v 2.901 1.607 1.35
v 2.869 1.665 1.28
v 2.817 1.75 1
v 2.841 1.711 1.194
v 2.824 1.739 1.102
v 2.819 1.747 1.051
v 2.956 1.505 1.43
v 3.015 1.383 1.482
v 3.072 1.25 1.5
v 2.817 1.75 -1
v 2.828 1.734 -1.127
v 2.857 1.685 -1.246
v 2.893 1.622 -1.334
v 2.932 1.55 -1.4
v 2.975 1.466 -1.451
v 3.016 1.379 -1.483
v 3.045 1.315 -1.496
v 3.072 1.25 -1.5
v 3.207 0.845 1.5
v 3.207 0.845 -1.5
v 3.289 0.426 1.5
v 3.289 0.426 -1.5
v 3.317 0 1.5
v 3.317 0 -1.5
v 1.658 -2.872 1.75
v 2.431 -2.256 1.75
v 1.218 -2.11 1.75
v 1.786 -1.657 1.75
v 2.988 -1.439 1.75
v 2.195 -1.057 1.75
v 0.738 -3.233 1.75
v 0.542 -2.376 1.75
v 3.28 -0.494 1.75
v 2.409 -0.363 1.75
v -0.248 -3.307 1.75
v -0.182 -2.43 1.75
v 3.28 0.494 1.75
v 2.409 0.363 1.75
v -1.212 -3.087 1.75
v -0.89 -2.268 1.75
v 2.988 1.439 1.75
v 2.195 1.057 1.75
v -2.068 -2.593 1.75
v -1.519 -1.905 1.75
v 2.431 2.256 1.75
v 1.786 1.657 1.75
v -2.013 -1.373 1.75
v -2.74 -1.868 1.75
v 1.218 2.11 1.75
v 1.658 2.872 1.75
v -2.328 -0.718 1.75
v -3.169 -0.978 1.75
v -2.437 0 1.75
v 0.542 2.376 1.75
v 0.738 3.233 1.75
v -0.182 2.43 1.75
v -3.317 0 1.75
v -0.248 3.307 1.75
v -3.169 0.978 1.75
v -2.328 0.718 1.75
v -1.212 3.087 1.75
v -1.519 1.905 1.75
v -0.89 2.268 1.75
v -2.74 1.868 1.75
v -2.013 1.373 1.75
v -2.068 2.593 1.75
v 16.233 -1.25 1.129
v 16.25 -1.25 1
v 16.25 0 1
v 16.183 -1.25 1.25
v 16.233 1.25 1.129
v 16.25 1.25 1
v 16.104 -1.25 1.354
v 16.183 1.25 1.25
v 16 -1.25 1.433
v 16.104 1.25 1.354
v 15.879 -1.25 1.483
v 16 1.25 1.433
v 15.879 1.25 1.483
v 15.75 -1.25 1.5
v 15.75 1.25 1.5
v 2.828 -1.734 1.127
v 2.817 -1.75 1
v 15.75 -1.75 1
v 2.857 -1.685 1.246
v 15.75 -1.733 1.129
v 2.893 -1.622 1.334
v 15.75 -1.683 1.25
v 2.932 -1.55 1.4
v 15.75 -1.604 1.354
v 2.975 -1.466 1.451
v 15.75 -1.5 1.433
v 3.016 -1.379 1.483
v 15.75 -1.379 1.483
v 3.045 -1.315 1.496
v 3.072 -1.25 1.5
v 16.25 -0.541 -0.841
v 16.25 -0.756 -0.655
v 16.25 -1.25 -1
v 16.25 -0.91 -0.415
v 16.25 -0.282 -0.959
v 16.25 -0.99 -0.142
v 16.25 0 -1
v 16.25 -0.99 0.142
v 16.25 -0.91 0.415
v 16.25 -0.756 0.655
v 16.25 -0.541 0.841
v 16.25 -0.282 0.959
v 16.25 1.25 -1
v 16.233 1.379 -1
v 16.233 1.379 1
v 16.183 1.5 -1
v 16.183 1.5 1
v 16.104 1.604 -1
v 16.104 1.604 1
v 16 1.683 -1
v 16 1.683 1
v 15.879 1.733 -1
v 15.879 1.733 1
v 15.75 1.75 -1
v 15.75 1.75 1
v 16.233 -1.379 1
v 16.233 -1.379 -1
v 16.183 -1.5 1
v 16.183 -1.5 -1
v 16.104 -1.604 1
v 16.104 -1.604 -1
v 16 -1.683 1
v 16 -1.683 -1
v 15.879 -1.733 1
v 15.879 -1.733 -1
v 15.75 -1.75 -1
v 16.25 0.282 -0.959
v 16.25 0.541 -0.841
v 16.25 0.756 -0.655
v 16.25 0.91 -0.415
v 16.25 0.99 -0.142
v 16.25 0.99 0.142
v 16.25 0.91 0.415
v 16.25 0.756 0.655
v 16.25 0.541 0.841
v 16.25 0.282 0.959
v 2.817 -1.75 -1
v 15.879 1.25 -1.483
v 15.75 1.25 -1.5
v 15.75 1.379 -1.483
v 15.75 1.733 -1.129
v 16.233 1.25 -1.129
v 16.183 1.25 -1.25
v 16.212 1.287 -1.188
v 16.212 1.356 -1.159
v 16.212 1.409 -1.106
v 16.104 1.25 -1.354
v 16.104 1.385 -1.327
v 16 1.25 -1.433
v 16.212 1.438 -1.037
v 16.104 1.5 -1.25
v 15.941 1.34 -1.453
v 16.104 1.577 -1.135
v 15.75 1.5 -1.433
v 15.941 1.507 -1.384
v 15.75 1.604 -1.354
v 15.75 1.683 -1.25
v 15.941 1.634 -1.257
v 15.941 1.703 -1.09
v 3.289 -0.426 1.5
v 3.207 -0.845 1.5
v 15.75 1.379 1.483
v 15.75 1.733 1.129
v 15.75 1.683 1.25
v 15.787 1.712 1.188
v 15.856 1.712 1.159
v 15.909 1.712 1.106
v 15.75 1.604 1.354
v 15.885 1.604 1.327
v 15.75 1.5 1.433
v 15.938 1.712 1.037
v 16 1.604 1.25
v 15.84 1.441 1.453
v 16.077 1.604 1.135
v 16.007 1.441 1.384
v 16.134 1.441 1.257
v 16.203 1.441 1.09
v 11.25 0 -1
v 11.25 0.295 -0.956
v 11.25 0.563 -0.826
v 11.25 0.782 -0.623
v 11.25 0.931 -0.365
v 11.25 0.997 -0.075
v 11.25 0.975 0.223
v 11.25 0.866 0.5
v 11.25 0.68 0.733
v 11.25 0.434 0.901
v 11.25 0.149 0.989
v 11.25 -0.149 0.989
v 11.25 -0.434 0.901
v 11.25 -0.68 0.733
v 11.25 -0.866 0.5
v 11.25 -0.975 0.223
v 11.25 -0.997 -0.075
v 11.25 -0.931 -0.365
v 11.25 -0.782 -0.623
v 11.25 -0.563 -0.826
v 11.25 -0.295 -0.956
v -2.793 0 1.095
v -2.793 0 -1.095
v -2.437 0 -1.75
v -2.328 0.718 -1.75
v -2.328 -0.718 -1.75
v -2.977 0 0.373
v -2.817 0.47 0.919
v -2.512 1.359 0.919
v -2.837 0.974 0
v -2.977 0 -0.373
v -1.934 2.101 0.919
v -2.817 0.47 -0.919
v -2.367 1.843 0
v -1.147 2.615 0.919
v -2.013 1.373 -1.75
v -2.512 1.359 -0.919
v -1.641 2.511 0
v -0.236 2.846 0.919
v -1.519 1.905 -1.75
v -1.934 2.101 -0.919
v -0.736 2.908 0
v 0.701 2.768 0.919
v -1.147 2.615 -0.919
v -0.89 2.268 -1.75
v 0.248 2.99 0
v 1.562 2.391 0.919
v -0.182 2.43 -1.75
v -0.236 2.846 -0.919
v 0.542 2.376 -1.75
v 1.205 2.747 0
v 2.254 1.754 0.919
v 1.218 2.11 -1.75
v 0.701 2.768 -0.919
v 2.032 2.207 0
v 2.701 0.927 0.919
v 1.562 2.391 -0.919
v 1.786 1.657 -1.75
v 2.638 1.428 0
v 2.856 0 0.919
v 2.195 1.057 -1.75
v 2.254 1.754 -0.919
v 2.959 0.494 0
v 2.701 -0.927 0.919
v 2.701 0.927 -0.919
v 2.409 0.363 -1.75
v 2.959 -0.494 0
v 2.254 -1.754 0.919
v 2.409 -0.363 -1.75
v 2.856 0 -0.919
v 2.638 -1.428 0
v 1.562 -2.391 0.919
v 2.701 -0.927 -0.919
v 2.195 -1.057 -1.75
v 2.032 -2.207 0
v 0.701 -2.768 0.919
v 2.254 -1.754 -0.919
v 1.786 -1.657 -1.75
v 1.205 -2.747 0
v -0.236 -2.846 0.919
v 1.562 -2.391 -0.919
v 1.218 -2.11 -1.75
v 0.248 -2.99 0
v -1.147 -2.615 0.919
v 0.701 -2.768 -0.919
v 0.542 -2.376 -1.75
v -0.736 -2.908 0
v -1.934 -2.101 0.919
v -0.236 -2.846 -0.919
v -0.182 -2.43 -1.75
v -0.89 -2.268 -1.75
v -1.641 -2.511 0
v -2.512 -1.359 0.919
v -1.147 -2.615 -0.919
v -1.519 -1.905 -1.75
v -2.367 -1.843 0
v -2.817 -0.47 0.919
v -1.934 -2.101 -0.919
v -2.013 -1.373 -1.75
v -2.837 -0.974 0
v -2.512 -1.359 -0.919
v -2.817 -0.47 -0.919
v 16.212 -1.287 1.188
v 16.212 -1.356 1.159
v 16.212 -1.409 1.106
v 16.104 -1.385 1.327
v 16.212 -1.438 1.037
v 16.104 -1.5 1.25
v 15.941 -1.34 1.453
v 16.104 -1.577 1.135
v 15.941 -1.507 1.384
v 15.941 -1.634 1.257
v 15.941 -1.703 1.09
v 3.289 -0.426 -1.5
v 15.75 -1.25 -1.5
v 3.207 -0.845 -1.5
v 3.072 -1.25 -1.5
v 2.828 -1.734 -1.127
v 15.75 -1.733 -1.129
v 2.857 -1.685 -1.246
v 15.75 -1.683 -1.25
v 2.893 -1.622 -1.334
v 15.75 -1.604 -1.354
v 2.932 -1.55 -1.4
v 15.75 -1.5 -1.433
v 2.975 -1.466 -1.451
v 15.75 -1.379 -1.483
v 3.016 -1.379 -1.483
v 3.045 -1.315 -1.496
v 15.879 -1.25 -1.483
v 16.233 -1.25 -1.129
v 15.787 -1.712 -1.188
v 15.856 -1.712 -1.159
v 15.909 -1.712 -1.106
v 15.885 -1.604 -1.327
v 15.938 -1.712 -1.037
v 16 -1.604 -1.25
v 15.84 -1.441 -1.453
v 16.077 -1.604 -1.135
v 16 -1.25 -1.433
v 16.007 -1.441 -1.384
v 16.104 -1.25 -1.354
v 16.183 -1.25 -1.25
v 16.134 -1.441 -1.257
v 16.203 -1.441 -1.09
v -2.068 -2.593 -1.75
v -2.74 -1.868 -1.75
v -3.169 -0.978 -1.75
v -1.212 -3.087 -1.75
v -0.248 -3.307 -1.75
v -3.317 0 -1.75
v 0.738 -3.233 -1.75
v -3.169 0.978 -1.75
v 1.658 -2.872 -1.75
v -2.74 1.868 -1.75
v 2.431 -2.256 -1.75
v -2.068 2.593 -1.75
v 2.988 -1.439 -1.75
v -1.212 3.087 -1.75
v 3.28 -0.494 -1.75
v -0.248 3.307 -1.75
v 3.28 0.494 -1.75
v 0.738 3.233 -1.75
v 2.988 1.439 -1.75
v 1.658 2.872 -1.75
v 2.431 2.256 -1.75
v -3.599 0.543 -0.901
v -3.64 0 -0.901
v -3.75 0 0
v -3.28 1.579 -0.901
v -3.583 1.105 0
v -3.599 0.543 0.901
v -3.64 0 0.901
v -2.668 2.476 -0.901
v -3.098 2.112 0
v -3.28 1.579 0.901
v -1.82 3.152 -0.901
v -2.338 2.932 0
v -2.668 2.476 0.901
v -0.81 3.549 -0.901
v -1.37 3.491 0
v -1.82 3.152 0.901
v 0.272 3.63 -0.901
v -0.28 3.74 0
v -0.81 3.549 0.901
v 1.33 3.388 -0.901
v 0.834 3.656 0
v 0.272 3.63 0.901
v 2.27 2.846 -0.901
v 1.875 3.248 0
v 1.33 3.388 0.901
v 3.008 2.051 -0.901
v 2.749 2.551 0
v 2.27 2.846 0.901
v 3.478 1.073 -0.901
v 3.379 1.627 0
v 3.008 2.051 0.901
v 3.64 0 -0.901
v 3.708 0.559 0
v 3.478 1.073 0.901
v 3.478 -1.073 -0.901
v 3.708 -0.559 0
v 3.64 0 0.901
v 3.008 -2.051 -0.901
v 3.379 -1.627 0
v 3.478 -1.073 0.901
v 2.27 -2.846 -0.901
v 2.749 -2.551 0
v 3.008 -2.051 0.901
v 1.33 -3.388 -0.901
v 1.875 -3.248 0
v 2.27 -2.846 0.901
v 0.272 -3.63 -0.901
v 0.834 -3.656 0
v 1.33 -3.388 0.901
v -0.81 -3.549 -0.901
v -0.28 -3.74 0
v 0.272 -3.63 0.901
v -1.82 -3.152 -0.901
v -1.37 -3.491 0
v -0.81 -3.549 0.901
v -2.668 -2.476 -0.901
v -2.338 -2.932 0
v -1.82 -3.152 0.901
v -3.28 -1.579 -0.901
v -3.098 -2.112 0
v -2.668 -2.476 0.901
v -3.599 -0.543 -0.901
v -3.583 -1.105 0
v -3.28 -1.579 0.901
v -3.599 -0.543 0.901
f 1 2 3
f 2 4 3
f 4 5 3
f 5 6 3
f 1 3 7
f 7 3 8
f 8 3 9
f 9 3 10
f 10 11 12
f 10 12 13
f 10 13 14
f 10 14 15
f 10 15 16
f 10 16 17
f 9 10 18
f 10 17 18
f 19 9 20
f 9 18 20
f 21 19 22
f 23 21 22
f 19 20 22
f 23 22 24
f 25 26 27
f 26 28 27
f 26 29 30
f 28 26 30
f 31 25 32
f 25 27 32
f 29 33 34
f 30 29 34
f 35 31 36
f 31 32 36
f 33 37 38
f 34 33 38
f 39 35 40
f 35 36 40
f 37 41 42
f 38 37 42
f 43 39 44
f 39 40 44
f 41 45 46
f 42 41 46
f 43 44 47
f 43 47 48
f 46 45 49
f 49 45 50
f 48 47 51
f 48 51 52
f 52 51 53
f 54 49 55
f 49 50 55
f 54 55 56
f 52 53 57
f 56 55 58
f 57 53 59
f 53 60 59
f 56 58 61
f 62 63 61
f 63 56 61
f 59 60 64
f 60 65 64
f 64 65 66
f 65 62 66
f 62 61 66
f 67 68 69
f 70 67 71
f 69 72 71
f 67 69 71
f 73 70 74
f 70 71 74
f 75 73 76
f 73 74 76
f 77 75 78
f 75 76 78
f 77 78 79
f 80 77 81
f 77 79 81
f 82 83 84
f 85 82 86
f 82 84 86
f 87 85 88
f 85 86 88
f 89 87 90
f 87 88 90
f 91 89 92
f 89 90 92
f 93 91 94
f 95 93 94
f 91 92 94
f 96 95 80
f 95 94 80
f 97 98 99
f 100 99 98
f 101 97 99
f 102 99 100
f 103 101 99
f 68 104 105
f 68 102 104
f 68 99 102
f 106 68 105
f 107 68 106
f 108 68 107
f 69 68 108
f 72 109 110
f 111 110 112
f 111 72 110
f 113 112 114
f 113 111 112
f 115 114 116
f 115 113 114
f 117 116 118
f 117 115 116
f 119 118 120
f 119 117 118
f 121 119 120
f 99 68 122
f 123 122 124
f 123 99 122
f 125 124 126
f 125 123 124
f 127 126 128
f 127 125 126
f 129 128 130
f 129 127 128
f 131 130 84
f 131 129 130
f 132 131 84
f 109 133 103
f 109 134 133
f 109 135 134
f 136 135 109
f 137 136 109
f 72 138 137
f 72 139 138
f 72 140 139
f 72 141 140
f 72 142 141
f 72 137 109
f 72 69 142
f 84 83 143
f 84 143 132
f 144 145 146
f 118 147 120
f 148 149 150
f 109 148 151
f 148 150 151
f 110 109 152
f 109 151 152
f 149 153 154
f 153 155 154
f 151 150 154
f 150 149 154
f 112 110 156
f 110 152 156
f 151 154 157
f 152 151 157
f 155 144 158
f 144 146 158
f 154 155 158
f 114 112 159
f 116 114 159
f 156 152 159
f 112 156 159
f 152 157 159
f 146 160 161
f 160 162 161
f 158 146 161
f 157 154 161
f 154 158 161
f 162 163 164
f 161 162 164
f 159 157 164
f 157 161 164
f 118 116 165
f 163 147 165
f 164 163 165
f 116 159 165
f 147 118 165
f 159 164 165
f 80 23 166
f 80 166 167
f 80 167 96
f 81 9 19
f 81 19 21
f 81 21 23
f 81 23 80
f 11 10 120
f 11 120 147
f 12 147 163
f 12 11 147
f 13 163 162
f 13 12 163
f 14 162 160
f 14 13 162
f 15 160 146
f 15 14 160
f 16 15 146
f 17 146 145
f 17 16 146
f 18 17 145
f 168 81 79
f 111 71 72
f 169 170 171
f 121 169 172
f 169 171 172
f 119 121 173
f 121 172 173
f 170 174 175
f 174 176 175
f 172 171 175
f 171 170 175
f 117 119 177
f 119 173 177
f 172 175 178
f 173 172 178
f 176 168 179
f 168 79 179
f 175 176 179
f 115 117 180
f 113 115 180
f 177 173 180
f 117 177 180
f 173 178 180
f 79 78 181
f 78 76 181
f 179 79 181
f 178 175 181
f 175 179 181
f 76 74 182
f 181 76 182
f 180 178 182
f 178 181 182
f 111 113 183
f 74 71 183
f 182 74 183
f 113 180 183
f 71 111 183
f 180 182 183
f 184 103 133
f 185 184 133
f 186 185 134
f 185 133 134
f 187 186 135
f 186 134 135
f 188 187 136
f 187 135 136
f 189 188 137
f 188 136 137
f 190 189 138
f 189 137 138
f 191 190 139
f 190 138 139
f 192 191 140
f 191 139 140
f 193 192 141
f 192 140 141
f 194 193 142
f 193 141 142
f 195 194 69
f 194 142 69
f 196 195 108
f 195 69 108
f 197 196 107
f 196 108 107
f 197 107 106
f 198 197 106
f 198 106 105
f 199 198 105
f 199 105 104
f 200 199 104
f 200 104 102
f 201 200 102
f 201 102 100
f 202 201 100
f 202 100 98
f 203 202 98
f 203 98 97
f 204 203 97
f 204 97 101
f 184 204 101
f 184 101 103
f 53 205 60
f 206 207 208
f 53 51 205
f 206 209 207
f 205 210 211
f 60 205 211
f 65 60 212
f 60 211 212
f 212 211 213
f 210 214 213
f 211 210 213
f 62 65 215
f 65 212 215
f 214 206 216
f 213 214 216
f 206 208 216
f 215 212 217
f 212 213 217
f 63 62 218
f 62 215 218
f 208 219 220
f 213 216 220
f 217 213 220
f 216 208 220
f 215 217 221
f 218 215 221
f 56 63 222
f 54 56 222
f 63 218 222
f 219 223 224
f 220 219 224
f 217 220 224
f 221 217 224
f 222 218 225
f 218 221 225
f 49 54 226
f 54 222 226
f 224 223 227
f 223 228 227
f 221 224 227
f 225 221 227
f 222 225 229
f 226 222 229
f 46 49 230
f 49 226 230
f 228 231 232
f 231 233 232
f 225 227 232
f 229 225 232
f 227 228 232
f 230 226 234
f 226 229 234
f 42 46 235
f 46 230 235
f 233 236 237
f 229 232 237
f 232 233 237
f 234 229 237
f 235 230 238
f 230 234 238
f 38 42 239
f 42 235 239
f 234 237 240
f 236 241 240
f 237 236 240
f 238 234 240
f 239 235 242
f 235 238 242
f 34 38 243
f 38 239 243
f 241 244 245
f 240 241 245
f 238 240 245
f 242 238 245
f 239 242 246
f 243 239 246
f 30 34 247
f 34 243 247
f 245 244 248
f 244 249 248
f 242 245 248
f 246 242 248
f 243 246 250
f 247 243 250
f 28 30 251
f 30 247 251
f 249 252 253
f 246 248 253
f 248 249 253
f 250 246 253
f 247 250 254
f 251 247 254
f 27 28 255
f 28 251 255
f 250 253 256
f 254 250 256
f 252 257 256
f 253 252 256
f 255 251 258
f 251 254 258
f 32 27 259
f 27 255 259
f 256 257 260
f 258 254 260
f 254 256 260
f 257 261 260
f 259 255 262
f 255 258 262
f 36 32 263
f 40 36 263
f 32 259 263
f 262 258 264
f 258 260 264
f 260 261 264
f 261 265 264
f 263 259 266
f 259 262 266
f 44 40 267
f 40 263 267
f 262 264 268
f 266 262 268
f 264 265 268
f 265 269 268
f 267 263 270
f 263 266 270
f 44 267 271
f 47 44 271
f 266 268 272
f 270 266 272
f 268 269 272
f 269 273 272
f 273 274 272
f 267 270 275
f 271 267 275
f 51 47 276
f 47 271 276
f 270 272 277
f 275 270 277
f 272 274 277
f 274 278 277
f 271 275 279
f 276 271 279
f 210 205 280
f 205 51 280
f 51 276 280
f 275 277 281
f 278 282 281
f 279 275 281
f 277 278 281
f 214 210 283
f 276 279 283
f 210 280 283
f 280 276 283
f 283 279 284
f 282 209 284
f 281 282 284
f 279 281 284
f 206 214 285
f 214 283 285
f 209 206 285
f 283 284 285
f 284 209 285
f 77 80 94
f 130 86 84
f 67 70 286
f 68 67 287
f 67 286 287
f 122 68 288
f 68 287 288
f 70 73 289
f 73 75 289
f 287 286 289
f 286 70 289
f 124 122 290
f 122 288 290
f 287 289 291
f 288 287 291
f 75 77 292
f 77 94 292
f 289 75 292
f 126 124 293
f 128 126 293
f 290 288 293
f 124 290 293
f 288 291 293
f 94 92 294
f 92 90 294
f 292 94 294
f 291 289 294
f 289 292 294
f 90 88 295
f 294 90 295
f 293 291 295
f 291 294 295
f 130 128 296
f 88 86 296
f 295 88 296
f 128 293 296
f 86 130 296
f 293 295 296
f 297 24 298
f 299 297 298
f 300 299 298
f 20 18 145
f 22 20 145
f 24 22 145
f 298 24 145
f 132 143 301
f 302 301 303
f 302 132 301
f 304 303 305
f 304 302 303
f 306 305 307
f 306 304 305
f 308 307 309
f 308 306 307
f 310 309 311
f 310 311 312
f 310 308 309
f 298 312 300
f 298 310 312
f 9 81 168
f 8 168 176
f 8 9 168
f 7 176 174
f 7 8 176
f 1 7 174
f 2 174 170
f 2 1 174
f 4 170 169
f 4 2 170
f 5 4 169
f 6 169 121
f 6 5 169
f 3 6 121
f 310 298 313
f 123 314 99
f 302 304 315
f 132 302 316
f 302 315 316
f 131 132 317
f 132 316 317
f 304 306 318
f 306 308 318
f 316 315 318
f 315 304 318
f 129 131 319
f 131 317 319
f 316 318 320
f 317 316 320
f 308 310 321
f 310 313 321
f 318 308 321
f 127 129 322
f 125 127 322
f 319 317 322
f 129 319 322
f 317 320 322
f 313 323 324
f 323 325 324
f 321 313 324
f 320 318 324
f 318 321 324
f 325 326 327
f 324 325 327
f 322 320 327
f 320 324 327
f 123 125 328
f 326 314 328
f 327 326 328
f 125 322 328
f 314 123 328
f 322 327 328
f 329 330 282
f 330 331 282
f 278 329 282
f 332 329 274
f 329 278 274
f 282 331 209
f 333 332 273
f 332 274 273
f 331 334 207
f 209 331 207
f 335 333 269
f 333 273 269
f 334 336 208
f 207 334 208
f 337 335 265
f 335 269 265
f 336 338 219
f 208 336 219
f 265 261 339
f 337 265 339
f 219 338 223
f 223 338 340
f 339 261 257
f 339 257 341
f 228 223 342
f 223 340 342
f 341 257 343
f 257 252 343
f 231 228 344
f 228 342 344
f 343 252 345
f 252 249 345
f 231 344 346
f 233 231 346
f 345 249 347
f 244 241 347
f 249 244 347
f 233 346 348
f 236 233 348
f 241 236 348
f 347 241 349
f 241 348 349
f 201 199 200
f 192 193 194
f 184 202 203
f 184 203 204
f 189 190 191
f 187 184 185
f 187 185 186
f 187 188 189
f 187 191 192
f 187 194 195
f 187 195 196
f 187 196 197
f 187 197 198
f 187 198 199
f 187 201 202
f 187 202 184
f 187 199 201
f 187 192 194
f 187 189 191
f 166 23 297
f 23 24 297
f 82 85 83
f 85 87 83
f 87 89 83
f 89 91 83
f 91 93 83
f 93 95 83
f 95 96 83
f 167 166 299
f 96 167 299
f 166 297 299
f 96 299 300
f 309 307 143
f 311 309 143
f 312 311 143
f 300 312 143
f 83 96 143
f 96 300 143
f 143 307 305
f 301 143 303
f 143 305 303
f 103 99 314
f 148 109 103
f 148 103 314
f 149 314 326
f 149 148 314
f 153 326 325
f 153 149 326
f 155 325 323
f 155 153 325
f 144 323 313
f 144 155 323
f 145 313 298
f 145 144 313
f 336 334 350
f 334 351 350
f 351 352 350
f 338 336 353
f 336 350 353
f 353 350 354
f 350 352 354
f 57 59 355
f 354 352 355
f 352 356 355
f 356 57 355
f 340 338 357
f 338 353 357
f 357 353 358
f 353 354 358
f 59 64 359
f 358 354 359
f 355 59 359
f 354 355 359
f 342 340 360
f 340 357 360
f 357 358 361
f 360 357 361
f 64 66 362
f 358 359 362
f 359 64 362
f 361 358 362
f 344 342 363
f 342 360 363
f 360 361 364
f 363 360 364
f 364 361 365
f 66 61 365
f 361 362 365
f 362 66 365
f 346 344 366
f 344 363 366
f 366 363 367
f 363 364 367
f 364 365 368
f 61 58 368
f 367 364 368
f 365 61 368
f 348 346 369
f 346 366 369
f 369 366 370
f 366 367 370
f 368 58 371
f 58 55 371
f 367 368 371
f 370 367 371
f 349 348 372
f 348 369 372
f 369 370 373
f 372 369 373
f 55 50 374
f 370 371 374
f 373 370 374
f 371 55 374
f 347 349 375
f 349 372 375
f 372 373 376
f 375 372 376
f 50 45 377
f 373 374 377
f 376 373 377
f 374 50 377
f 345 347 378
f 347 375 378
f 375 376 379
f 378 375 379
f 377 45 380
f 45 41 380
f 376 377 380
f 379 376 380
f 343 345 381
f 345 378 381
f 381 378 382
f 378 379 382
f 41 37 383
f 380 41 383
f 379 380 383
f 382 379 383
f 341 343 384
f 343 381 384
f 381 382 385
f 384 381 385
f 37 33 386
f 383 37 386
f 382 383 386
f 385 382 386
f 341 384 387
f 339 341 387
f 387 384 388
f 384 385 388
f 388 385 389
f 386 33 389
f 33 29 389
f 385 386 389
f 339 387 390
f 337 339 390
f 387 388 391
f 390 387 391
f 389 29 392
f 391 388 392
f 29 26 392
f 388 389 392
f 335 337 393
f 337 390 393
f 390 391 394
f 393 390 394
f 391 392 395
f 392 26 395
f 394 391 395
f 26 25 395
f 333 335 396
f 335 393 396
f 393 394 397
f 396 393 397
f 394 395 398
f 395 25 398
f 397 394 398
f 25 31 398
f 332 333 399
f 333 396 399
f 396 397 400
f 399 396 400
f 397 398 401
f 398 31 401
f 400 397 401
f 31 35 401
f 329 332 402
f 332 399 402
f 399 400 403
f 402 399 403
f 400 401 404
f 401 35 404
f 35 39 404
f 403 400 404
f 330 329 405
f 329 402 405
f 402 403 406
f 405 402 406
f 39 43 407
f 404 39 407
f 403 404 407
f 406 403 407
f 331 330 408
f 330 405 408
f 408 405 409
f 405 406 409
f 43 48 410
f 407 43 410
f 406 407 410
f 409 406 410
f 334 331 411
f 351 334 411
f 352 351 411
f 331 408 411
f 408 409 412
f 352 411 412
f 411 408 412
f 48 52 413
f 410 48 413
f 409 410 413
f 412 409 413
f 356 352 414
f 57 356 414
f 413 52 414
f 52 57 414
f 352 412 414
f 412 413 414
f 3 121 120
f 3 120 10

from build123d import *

# Parameters (mm, degrees)
EXTRUDE_1_DEPTH     = 1.5
FILLET_1_R          = 0.5
SKETCH_3_R          = 1
CUT_EXTRUDE_1_DEPTH = 5


with BuildPart() as part:
    # 草图1 → 旋转1 (revolve)
    with BuildSketch(Plane(origin=(0, 0, 0), x_dir=(1, 0, 0), z_dir=(0, 1, 0))):
        with BuildLine():
            Line((-2.436698586, 1.75), (-3.31662479, 1.75))
            ThreePointArc((-3.31662479, 1.75), (-3.75, 0), (-3.31662479, -1.75))
            Line((-3.31662479, -1.75), (-2.436698586, -1.75))
            ThreePointArc((-2.436698586, -1.75), (-3, 0), (-2.436698586, 1.75))
        make_face()
    revolve(axis=Axis((0, 0, 116.11690901), (0, 0, -1)))


with BuildPart() as body_2:
    # 草图2 → 凸台-拉伸1 (new body, symmetric)
    with BuildSketch(Plane.XY):
        with BuildLine():
            Line((3.31662479, -1.75), (16.25, -1.75))
            Line((16.25, -1.75), (16.25, 1.75))
            Line((16.25, 1.75), (3.31662479, 1.75))
            Line((3.31662479, 1.75), (2.817356917, 1.75))
            ThreePointArc((2.817356917, 1.75), (3.189366379, 0.909913239), (3.31662479, 0))
            ThreePointArc((3.31662479, 0), (3.189366379, -0.909913239), (2.817356917, -1.75))
            Line((2.817356917, -1.75), (3.31662479, -1.75))
        make_face()
    extrude(amount=EXTRUDE_1_DEPTH, both=True)

    # 圆角1
    fillet_1_edges = [body_2.edges().sort_by_distance(p)[0] for p in [
        (9.533678459, -1.75, 1.5),
        (16.25, 0, 1.5),
        (9.533678459, 1.75, 1.5),
        (9.533678459, 1.75, -1.5),
        (16.25, 0, -1.5),
        (9.533678459, -1.75, -1.5),
        (16.25, 1.75, 0),
        (16.25, -1.75, 0),
    ]]
    fillet(fillet_1_edges, radius=FILLET_1_R)

    # 草图3 → 切除-拉伸1 (cut)
    with BuildSketch(Plane(origin=(16.25, 0, 0), x_dir=(0, 0, -1), z_dir=(1, 0, 0))):
        Circle(SKETCH_3_R)
    extrude(amount=-CUT_EXTRUDE_1_DEPTH, mode=Mode.SUBTRACT)


solid = Compound([part.part, body_2.part])
